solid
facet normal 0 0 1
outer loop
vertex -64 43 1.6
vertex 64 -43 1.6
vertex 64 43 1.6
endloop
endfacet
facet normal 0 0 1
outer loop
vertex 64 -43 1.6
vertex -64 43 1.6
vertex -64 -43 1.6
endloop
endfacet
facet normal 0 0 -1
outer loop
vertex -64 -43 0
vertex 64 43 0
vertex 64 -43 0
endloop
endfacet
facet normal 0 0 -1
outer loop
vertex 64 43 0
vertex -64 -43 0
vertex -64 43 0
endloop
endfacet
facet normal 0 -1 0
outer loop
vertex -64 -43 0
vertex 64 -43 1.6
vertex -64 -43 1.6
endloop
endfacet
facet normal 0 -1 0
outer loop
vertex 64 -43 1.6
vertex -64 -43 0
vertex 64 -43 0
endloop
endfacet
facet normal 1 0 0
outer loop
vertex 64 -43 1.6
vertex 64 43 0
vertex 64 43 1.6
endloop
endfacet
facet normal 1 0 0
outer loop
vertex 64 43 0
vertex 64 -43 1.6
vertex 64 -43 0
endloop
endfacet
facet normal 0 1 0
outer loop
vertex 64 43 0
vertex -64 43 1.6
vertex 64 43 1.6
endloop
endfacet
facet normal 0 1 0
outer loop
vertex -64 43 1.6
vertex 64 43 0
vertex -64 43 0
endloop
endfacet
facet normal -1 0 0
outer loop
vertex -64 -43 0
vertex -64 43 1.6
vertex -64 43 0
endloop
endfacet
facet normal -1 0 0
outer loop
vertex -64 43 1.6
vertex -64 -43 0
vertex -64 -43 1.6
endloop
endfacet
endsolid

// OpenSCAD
// Seed OpenSCAD file for task 04; complete it from 01_kicad_mechanical_map.csv.
$fn = 32;
board = [128.000, 86.000, 1.600];
wall = 3.200;
module placeholder_board() {
  translate([-board[0]/2, -board[1]/2, 0]) cube(board);
}
placeholder_board();
